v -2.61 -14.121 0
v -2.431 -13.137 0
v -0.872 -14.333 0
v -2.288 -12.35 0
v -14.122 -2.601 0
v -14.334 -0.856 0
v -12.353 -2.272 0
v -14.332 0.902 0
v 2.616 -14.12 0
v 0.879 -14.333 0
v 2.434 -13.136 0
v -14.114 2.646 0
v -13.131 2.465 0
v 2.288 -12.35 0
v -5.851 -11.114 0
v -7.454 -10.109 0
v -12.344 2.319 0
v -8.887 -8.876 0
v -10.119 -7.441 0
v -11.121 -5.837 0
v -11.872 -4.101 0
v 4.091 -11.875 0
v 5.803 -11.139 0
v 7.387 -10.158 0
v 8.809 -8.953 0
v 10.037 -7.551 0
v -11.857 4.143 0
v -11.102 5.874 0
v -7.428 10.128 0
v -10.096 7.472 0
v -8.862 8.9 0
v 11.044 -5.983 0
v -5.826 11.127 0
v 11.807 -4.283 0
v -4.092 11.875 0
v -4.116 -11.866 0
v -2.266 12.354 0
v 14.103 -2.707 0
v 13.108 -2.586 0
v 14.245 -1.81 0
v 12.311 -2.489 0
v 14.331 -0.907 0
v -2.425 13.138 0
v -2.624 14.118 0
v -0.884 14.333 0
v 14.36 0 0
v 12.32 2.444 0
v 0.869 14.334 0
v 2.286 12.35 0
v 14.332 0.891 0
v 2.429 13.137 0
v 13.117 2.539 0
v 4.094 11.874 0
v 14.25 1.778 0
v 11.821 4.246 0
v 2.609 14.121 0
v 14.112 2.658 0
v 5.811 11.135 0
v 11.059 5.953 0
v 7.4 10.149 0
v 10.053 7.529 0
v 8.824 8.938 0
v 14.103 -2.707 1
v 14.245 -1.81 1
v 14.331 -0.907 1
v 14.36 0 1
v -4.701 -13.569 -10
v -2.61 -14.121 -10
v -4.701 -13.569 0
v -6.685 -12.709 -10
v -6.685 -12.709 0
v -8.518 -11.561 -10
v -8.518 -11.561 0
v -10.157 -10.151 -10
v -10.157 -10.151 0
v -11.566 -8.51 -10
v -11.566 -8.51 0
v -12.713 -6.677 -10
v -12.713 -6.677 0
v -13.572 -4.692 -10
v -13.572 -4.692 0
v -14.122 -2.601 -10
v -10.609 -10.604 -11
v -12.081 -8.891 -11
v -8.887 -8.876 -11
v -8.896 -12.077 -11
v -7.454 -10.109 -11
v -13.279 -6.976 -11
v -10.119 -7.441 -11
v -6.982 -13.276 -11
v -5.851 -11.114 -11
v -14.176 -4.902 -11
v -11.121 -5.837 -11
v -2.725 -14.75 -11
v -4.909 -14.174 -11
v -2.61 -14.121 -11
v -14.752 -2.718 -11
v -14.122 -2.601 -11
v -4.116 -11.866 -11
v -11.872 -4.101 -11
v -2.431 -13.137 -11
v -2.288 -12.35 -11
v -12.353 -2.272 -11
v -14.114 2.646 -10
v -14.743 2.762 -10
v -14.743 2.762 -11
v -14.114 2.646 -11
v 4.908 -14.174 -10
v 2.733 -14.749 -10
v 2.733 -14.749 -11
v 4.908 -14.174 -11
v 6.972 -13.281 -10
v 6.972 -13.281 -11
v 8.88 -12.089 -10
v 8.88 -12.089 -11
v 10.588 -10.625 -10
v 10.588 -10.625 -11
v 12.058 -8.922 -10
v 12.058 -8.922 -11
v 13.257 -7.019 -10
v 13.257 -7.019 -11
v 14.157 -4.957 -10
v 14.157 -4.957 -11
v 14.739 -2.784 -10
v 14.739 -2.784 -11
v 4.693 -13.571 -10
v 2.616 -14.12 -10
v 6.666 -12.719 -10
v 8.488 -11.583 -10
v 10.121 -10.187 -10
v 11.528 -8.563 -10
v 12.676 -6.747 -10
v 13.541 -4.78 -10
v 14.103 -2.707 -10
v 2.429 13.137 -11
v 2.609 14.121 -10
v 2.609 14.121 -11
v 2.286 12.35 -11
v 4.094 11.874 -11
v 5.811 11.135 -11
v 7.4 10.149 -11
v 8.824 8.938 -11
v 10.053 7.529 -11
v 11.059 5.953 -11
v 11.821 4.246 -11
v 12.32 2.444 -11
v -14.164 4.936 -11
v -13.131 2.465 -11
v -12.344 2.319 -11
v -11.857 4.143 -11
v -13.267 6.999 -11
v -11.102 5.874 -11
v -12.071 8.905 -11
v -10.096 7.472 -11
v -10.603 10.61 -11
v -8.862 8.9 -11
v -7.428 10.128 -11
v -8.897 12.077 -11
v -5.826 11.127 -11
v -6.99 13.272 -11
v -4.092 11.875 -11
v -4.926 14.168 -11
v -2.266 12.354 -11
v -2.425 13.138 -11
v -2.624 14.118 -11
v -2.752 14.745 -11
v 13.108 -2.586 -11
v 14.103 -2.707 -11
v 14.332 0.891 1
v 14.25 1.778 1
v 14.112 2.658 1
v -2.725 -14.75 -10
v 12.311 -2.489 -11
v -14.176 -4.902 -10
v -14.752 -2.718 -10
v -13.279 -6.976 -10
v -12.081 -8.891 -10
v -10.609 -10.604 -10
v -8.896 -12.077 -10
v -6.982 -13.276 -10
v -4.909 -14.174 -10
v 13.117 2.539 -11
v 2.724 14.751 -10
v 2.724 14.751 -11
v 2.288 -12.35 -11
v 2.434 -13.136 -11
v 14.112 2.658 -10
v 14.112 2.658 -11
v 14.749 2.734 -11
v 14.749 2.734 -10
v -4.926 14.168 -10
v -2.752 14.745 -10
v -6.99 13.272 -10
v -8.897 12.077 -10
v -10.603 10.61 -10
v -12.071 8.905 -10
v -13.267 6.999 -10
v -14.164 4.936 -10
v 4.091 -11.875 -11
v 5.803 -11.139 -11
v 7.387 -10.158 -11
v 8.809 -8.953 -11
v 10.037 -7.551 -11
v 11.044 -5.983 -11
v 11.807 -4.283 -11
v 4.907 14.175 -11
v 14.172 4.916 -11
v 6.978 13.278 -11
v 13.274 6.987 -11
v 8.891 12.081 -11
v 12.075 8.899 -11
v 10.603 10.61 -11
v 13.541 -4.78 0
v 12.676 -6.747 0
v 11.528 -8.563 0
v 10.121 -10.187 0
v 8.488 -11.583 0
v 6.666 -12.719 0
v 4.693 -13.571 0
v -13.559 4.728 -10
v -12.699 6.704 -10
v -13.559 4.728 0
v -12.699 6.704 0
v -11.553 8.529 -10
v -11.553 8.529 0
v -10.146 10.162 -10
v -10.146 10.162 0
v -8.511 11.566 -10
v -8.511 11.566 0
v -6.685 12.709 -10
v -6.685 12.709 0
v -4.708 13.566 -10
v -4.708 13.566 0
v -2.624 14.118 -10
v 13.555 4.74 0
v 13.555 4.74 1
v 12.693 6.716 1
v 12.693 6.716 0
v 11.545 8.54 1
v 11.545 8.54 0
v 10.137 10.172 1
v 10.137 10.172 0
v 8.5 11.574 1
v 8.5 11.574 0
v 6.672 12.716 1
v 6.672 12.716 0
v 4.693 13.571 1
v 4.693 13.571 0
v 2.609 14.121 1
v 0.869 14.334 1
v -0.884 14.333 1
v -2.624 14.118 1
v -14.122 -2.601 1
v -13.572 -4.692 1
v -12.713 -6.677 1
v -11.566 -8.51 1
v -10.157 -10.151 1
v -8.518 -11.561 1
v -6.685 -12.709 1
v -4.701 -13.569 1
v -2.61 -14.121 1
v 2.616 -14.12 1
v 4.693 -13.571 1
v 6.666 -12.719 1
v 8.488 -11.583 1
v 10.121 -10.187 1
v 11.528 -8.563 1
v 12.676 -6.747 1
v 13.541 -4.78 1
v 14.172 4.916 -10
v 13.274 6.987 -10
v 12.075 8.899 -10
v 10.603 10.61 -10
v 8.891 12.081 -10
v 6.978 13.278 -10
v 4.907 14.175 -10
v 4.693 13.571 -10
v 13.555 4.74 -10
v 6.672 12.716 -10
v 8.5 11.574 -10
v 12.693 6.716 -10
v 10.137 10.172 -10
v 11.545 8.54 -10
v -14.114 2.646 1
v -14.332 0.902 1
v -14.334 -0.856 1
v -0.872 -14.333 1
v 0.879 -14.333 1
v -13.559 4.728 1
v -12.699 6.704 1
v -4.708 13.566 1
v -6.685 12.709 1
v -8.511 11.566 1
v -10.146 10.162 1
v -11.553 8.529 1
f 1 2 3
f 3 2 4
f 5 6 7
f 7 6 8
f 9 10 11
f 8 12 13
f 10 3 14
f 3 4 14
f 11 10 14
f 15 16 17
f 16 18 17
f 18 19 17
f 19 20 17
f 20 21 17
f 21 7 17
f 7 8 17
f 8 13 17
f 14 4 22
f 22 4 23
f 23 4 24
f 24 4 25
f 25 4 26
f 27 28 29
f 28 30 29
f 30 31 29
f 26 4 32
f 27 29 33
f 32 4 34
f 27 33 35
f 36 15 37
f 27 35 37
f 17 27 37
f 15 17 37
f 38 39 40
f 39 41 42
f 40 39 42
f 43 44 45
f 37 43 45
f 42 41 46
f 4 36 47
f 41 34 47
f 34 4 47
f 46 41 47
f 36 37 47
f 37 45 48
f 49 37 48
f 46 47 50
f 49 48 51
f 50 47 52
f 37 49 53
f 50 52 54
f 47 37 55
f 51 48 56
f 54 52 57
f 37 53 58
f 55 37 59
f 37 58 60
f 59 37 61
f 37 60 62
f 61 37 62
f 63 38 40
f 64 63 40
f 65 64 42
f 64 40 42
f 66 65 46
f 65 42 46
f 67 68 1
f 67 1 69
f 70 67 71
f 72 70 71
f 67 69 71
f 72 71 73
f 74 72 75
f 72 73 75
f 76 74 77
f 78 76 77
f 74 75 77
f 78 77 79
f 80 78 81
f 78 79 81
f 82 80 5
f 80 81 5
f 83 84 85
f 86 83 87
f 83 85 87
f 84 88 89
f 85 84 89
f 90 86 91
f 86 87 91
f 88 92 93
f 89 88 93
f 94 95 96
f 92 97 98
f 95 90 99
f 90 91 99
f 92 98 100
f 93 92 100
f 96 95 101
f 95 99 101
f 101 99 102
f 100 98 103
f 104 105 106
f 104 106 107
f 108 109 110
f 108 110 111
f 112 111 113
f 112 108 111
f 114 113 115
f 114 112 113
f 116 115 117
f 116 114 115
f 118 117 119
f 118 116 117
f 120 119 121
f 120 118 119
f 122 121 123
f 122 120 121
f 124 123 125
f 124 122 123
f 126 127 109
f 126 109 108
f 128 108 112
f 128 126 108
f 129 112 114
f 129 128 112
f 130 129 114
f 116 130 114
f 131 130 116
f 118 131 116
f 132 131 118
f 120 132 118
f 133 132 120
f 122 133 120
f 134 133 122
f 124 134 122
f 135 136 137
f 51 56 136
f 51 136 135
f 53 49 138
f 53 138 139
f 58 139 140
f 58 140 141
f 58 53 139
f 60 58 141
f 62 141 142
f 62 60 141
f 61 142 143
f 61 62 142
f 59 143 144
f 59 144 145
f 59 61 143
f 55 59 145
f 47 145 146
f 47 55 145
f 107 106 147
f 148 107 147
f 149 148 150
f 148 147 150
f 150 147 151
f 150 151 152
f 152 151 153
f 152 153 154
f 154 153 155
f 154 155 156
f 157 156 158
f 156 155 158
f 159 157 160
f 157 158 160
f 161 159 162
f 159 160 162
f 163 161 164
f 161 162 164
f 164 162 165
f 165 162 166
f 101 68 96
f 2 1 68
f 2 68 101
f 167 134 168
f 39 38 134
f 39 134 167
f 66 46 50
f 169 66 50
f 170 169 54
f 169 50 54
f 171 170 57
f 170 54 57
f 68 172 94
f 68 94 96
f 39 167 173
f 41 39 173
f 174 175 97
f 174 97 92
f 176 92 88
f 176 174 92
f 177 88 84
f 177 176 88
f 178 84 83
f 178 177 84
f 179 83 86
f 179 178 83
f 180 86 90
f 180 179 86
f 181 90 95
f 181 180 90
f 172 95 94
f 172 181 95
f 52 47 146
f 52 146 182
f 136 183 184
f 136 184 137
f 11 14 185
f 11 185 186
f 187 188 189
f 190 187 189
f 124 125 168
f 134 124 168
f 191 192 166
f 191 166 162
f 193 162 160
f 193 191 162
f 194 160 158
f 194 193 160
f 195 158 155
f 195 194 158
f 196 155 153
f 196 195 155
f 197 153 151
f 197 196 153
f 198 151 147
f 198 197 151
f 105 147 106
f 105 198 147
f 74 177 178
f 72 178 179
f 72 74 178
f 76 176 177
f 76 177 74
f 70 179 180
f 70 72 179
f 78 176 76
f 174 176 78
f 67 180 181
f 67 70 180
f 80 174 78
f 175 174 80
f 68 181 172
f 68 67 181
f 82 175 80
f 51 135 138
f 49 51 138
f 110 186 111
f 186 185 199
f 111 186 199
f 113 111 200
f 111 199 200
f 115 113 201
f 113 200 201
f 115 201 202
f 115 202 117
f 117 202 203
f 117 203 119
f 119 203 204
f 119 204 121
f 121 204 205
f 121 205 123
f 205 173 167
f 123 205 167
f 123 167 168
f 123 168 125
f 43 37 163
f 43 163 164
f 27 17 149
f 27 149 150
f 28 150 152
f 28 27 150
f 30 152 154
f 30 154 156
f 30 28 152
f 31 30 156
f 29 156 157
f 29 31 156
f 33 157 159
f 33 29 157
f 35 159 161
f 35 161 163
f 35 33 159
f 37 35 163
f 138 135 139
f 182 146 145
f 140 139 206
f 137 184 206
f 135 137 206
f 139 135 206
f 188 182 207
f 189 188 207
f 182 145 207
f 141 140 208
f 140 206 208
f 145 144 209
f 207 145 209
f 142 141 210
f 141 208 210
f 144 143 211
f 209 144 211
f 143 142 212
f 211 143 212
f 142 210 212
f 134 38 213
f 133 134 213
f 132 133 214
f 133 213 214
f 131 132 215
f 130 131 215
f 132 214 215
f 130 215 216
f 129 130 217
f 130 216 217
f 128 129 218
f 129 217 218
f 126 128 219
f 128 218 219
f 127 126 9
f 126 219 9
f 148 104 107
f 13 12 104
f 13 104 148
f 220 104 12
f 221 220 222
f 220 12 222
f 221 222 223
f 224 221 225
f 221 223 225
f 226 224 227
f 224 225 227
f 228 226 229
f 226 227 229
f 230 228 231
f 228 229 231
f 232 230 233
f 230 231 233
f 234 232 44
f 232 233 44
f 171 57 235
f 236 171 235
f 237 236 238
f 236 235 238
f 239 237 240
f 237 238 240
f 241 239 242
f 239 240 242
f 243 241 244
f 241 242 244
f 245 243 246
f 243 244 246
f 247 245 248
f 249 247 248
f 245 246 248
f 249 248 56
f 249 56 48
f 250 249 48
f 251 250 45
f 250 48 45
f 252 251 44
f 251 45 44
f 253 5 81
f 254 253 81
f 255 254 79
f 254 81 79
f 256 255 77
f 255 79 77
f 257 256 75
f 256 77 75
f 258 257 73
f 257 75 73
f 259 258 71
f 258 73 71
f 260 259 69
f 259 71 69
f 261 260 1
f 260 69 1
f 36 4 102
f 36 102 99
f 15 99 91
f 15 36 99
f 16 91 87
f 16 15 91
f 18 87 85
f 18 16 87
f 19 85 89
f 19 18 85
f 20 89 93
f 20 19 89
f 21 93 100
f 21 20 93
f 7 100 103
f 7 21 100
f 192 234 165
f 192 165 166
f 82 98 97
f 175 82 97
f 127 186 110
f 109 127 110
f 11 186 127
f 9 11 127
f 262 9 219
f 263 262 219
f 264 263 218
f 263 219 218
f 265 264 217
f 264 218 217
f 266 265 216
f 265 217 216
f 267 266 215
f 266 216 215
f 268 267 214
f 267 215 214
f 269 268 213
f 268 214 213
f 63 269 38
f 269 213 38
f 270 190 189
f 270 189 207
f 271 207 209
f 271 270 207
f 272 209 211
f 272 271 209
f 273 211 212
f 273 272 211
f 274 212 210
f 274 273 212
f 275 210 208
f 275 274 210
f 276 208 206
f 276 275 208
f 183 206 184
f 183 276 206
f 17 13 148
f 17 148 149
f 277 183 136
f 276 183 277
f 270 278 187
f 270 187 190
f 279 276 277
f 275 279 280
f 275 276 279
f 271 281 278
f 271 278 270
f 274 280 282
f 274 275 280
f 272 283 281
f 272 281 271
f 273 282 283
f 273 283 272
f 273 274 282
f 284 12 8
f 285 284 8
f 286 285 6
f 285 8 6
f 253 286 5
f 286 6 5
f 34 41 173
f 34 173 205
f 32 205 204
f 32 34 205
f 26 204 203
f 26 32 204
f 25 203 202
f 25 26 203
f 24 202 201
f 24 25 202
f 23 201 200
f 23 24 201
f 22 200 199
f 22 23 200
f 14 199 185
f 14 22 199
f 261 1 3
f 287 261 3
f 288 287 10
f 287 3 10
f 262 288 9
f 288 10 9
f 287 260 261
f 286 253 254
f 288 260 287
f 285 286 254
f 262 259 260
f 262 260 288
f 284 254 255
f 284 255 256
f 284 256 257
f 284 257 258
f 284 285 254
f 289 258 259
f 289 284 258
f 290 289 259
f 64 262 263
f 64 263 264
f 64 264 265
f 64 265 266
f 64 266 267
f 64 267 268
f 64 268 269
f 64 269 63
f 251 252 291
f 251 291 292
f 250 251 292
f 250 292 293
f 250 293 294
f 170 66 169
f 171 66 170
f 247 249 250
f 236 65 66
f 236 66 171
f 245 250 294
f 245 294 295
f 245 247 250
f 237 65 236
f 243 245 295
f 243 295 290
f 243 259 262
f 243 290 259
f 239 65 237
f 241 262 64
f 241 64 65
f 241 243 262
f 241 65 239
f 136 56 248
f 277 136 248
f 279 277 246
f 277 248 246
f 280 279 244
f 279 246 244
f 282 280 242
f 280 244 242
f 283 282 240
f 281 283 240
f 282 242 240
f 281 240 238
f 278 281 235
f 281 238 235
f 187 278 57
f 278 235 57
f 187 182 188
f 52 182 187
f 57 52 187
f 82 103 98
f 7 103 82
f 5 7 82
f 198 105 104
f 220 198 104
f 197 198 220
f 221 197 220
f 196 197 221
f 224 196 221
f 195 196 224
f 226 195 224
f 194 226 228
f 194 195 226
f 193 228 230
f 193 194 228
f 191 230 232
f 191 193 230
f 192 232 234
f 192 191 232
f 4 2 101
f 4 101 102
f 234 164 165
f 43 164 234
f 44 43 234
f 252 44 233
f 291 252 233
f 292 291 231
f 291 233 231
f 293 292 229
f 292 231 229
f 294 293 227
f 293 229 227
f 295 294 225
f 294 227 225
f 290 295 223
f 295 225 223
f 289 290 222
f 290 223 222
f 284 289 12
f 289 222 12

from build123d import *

# Parameters (mm, degrees)
F1_DEPTH = 1
F2_DEPTH = 11
F3_DEPTH = 10


with BuildPart() as f1:
    # F0 (on Top) → F1 (new body)
    with BuildSketch(Plane.XY):
        with BuildLine():
            ThreePointArc((12.3109959605, -2.4885695612), (12.4975939537, -1.250498048), (12.56, 0))
            ThreePointArc((12.56, 0), (12.499849565, 1.227746249), (12.3199743866, 2.4437330282))
            ThreePointArc((12.3199743866, 2.4437330282), (8.8241351782, 8.9380220607), (2.2855528975, 12.3502974844))
            ThreePointArc((2.2855528975, 12.3502974844), (0.0100228873, 12.5599960009), (-2.2658389037, 12.3539294988))
            ThreePointArc((-2.2658389037, 12.3539294988), (-8.8620220769, 8.9004586797), (-12.3440076572, 2.3192832854))
            ThreePointArc((-12.3440076572, 2.3192832854), (-12.559977123, 0.023972266), (-12.3527709674, -2.2721464362))
            ThreePointArc((-12.3527709674, -2.2721464362), (-8.8868925427, -8.8756262277), (-2.2878147001, -12.3498786997))
            ThreePointArc((-2.2878147001, -12.3498786997), (0.0002376292, -12.5599999978), (2.2882820061, -12.3497921222))
            ThreePointArc((2.2882820061, -12.3497921222), (8.8088397015, -8.9530968449), (12.3109959605, -2.4885695612))
        make_face()
        with BuildLine():
            ThreePointArc((12.3199743866, 2.4437330282), (12.499849565, 1.227746249), (12.56, 0))
            ThreePointArc((12.56, 0), (12.4975939537, -1.250498048), (12.3109959605, -2.4885695612))
            Line((12.3109959605, -2.4885695612), (13.1075011071, -2.5855424186))
            Line((13.1075011071, -2.5855424186), (14.1026028651, -2.7066940036))
            ThreePointArc((14.1026028651, -2.7066940036), (14.2955058872, -1.3594526209), (14.36, 0))
            ThreePointArc((14.36, 0), (14.2978344087, 1.334740133), (14.1118758743, 2.657923872))
            Line((14.1118758743, 2.657923872), (13.1166017889, 2.5389560617))
            Line((13.1166017889, 2.5389560617), (12.3199743866, 2.4437330282))
        make_face()
        with BuildLine():
            ThreePointArc((2.2855528975, 12.3502974844), (8.8241351782, 8.9380220607), (12.3199743866, 2.4437330282))
            Line((12.3199743866, 2.4437330282), (13.1166017889, 2.5389560617))
            Line((13.1166017889, 2.5389560617), (14.1118758743, 2.657923872))
            ThreePointArc((14.1118758743, 2.657923872), (10.136505033, 10.1715714477), (2.6091735777, 14.1209706905))
            Line((2.6091735777, 14.1209706905), (2.4293843449, 13.1372635399))
            Line((2.4293843449, 13.1372635399), (2.2855528975, 12.3502974844))
        make_face()
        with BuildLine():
            Line((13.1075011071, -2.5855424186), (12.3109959605, -2.4885695612))
            ThreePointArc((12.3109959605, -2.4885695612), (8.8088397015, -8.9530968449), (2.2882820061, -12.3497921222))
            Line((2.2882820061, -12.3497921222), (2.4340324524, -13.1364030853))
            Line((2.4340324524, -13.1364030853), (2.6162205102, -14.1196667893))
            ThreePointArc((2.6162205102, -14.1196667893), (10.1214500303, -10.1865523748), (14.1026028651, -2.7066940036))
            Line((14.1026028651, -2.7066940036), (13.1075011071, -2.5855424186))
        make_face()
        with BuildLine():
            ThreePointArc((-2.2658389037, 12.3539294988), (0.0100228873, 12.5599960009), (2.2855528975, 12.3502974844))
            Line((2.2855528975, 12.3502974844), (2.4293843449, 13.1372635399))
            Line((2.4293843449, 13.1372635399), (2.6091735777, 14.1209706905))
            ThreePointArc((2.6091735777, 14.1209706905), (-0.0077642493, 14.359997901), (-2.624442069, 14.118140948))
            Line((-2.624442069, 14.118140948), (-2.4252208949, 13.1380372835))
            Line((-2.4252208949, 13.1380372835), (-2.2658389037, 12.3539294988))
        make_face()
        with BuildLine():
            Line((2.4340324524, -13.1364030853), (2.2882820061, -12.3497921222))
            ThreePointArc((2.2882820061, -12.3497921222), (0.0002376292, -12.5599999978), (-2.2878147001, -12.3498786997))
            Line((-2.2878147001, -12.3498786997), (-2.431047805, -13.136955882))
            Line((-2.431047805, -13.136955882), (-2.6100890312, -14.1208015087))
            ThreePointArc((-2.6100890312, -14.1208015087), (0.0031177966, -14.3599996615), (2.6162205102, -14.1196667893))
            Line((2.6162205102, -14.1196667893), (2.4340324524, -13.1364030853))
        make_face()
        with BuildLine():
            ThreePointArc((-12.3440076572, 2.3192832854), (-8.8620220769, 8.9004586797), (-2.2658389037, 12.3539294988))
            Line((-2.2658389037, 12.3539294988), (-2.4252208949, 13.1380372835))
            Line((-2.4252208949, 13.1380372835), (-2.624442069, 14.118140948))
            ThreePointArc((-2.624442069, 14.118140948), (-10.146271601, 10.1618291955), (-14.1141033231, 2.6460701775))
            Line((-14.1141033231, 2.6460701775), (-13.1307172202, 2.4645219739))
            Line((-13.1307172202, 2.4645219739), (-12.3440076572, 2.3192832854))
        make_face()
        with BuildLine():
            Line((-2.431047805, -13.136955882), (-2.2878147001, -12.3498786997))
            ThreePointArc((-2.2878147001, -12.3498786997), (-8.8868925427, -8.8756262277), (-12.3527709674, -2.2721464362))
            Line((-12.3527709674, -2.2721464362), (-14.1224720777, -2.601034874))
            ThreePointArc((-14.1224720777, -2.601034874), (-10.1573080166, -10.1507976955), (-2.6100890312, -14.1208015087))
            Line((-2.6100890312, -14.1208015087), (-2.431047805, -13.136955882))
        make_face()
        with BuildLine():
            ThreePointArc((-12.3527709674, -2.2721464362), (-12.559977123, 0.023972266), (-12.3440076572, 2.3192832854))
            Line((-12.3440076572, 2.3192832854), (-13.1307172202, 2.4645219739))
            Line((-13.1307172202, 2.4645219739), (-14.1141033231, 2.6460701775))
            ThreePointArc((-14.1141033231, 2.6460701775), (-14.3599817356, 0.0229031363), (-14.1224720777, -2.601034874))
            Line((-14.1224720777, -2.601034874), (-12.3527709674, -2.2721464362))
        make_face()
    extrude(amount=F1_DEPTH)

    # F0 (on Top) → F2 (join)
    with BuildSketch(Plane.XY):
        with BuildLine():
            ThreePointArc((2.2855528975, 12.3502974844), (8.8241351782, 8.9380220607), (12.3199743866, 2.4437330282))
            Line((12.3199743866, 2.4437330282), (13.1166017889, 2.5389560617))
            Line((13.1166017889, 2.5389560617), (14.1118758743, 2.657923872))
            ThreePointArc((14.1118758743, 2.657923872), (10.136505033, 10.1715714477), (2.6091735777, 14.1209706905))
            Line((2.6091735777, 14.1209706905), (2.4293843449, 13.1372635399))
            Line((2.4293843449, 13.1372635399), (2.2855528975, 12.3502974844))
        make_face()
        with BuildLine():
            Line((13.1075011071, -2.5855424186), (12.3109959605, -2.4885695612))
            ThreePointArc((12.3109959605, -2.4885695612), (8.8088397015, -8.9530968449), (2.2882820061, -12.3497921222))
            Line((2.2882820061, -12.3497921222), (2.4340324524, -13.1364030853))
            Line((2.4340324524, -13.1364030853), (2.6162205102, -14.1196667893))
            ThreePointArc((2.6162205102, -14.1196667893), (10.1214500303, -10.1865523748), (14.1026028651, -2.7066940036))
            Line((14.1026028651, -2.7066940036), (13.1075011071, -2.5855424186))
        make_face()
        with BuildLine():
            ThreePointArc((-12.3440076572, 2.3192832854), (-8.8620220769, 8.9004586797), (-2.2658389037, 12.3539294988))
            Line((-2.2658389037, 12.3539294988), (-2.4252208949, 13.1380372835))
            Line((-2.4252208949, 13.1380372835), (-2.624442069, 14.118140948))
            ThreePointArc((-2.624442069, 14.118140948), (-10.146271601, 10.1618291955), (-14.1141033231, 2.6460701775))
            Line((-14.1141033231, 2.6460701775), (-13.1307172202, 2.4645219739))
            Line((-13.1307172202, 2.4645219739), (-12.3440076572, 2.3192832854))
        make_face()
        with BuildLine():
            ThreePointArc((2.6091735777, 14.1209706905), (10.136505033, 10.1715714477), (14.1118758743, 2.657923872))
            Line((14.1118758743, 2.657923872), (14.7487280331, 2.7340485374))
            ThreePointArc((14.7487280331, 2.7340485374), (10.6030739469, 10.6101283158), (2.7242386681, 14.7505431656))
            Line((2.7242386681, 14.7505431656), (2.6091735777, 14.1209706905))
        make_face()
        with BuildLine():
            Line((-2.431047805, -13.136955882), (-2.2878147001, -12.3498786997))
            ThreePointArc((-2.2878147001, -12.3498786997), (-8.8868925427, -8.8756262277), (-12.3527709674, -2.2721464362))
            Line((-12.3527709674, -2.2721464362), (-14.1224720777, -2.601034874))
            ThreePointArc((-14.1224720777, -2.601034874), (-10.1573080166, -10.1507976955), (-2.6100890312, -14.1208015087))
            Line((-2.6100890312, -14.1208015087), (-2.431047805, -13.136955882))
        make_face()
        with BuildLine():
            Line((14.7393400257, -2.7842154385), (14.1026028651, -2.7066940036))
            ThreePointArc((14.1026028651, -2.7066940036), (10.1214500303, -10.1865523748), (2.6162205102, -14.1196667893))
            Line((2.6162205102, -14.1196667893), (2.7328208672, -14.7489555599))
            ThreePointArc((2.7328208672, -14.7489555599), (10.5880995986, -10.6250716181), (14.7393400257, -2.7842154385))
        make_face()
        with BuildLine():
            ThreePointArc((-14.1141033231, 2.6460701775), (-10.146271601, 10.1618291955), (-2.624442069, 14.118140948))
            Line((-2.624442069, 14.118140948), (-2.7519420936, 14.7453997814))
            ThreePointArc((-2.7519420936, 14.7453997814), (-10.6028895523, 10.6103125845), (-14.7434702232, 2.7622609899))
            Line((-14.7434702232, 2.7622609899), (-14.1141033231, 2.6460701775))
        make_face()
        with BuildLine():
            ThreePointArc((-2.6100890312, -14.1208015087), (-10.1573080166, -10.1507976955), (-14.1224720777, -2.601034874))
            Line((-14.1224720777, -2.601034874), (-14.7516989871, -2.717972957))
            ThreePointArc((-14.7516989871, -2.717972957), (-10.6090110951, -10.6041917931), (-2.7246753784, -14.750462504))
            Line((-2.7246753784, -14.750462504), (-2.6100890312, -14.1208015087))
        make_face()
    extrude(amount=-F2_DEPTH)

    # F0 (on Top) → F3 (cut)
    with BuildSketch(Plane.XY):
        with BuildLine():
            ThreePointArc((-14.1141033231, 2.6460701775), (-10.146271601, 10.1618291955), (-2.624442069, 14.118140948))
            Line((-2.624442069, 14.118140948), (-2.7519420936, 14.7453997814))
            ThreePointArc((-2.7519420936, 14.7453997814), (-10.6028895523, 10.6103125845), (-14.7434702232, 2.7622609899))
            Line((-14.7434702232, 2.7622609899), (-14.1141033231, 2.6460701775))
        make_face()
        with BuildLine():
            ThreePointArc((2.6091735777, 14.1209706905), (10.136505033, 10.1715714477), (14.1118758743, 2.657923872))
            Line((14.1118758743, 2.657923872), (14.7487280331, 2.7340485374))
            ThreePointArc((14.7487280331, 2.7340485374), (10.6030739469, 10.6101283158), (2.7242386681, 14.7505431656))
            Line((2.7242386681, 14.7505431656), (2.6091735777, 14.1209706905))
        make_face()
        with BuildLine():
            Line((14.7393400257, -2.7842154385), (14.1026028651, -2.7066940036))
            ThreePointArc((14.1026028651, -2.7066940036), (10.1214500303, -10.1865523748), (2.6162205102, -14.1196667893))
            Line((2.6162205102, -14.1196667893), (2.7328208672, -14.7489555599))
            ThreePointArc((2.7328208672, -14.7489555599), (10.5880995986, -10.6250716181), (14.7393400257, -2.7842154385))
        make_face()
        with BuildLine():
            ThreePointArc((-2.6100890312, -14.1208015087), (-10.1573080166, -10.1507976955), (-14.1224720777, -2.601034874))
            Line((-14.1224720777, -2.601034874), (-14.7516989871, -2.717972957))
            ThreePointArc((-14.7516989871, -2.717972957), (-10.6090110951, -10.6041917931), (-2.7246753784, -14.750462504))
            Line((-2.7246753784, -14.750462504), (-2.6100890312, -14.1208015087))
        make_face()
    extrude(amount=-F3_DEPTH, mode=Mode.SUBTRACT)


solid = f1.part
